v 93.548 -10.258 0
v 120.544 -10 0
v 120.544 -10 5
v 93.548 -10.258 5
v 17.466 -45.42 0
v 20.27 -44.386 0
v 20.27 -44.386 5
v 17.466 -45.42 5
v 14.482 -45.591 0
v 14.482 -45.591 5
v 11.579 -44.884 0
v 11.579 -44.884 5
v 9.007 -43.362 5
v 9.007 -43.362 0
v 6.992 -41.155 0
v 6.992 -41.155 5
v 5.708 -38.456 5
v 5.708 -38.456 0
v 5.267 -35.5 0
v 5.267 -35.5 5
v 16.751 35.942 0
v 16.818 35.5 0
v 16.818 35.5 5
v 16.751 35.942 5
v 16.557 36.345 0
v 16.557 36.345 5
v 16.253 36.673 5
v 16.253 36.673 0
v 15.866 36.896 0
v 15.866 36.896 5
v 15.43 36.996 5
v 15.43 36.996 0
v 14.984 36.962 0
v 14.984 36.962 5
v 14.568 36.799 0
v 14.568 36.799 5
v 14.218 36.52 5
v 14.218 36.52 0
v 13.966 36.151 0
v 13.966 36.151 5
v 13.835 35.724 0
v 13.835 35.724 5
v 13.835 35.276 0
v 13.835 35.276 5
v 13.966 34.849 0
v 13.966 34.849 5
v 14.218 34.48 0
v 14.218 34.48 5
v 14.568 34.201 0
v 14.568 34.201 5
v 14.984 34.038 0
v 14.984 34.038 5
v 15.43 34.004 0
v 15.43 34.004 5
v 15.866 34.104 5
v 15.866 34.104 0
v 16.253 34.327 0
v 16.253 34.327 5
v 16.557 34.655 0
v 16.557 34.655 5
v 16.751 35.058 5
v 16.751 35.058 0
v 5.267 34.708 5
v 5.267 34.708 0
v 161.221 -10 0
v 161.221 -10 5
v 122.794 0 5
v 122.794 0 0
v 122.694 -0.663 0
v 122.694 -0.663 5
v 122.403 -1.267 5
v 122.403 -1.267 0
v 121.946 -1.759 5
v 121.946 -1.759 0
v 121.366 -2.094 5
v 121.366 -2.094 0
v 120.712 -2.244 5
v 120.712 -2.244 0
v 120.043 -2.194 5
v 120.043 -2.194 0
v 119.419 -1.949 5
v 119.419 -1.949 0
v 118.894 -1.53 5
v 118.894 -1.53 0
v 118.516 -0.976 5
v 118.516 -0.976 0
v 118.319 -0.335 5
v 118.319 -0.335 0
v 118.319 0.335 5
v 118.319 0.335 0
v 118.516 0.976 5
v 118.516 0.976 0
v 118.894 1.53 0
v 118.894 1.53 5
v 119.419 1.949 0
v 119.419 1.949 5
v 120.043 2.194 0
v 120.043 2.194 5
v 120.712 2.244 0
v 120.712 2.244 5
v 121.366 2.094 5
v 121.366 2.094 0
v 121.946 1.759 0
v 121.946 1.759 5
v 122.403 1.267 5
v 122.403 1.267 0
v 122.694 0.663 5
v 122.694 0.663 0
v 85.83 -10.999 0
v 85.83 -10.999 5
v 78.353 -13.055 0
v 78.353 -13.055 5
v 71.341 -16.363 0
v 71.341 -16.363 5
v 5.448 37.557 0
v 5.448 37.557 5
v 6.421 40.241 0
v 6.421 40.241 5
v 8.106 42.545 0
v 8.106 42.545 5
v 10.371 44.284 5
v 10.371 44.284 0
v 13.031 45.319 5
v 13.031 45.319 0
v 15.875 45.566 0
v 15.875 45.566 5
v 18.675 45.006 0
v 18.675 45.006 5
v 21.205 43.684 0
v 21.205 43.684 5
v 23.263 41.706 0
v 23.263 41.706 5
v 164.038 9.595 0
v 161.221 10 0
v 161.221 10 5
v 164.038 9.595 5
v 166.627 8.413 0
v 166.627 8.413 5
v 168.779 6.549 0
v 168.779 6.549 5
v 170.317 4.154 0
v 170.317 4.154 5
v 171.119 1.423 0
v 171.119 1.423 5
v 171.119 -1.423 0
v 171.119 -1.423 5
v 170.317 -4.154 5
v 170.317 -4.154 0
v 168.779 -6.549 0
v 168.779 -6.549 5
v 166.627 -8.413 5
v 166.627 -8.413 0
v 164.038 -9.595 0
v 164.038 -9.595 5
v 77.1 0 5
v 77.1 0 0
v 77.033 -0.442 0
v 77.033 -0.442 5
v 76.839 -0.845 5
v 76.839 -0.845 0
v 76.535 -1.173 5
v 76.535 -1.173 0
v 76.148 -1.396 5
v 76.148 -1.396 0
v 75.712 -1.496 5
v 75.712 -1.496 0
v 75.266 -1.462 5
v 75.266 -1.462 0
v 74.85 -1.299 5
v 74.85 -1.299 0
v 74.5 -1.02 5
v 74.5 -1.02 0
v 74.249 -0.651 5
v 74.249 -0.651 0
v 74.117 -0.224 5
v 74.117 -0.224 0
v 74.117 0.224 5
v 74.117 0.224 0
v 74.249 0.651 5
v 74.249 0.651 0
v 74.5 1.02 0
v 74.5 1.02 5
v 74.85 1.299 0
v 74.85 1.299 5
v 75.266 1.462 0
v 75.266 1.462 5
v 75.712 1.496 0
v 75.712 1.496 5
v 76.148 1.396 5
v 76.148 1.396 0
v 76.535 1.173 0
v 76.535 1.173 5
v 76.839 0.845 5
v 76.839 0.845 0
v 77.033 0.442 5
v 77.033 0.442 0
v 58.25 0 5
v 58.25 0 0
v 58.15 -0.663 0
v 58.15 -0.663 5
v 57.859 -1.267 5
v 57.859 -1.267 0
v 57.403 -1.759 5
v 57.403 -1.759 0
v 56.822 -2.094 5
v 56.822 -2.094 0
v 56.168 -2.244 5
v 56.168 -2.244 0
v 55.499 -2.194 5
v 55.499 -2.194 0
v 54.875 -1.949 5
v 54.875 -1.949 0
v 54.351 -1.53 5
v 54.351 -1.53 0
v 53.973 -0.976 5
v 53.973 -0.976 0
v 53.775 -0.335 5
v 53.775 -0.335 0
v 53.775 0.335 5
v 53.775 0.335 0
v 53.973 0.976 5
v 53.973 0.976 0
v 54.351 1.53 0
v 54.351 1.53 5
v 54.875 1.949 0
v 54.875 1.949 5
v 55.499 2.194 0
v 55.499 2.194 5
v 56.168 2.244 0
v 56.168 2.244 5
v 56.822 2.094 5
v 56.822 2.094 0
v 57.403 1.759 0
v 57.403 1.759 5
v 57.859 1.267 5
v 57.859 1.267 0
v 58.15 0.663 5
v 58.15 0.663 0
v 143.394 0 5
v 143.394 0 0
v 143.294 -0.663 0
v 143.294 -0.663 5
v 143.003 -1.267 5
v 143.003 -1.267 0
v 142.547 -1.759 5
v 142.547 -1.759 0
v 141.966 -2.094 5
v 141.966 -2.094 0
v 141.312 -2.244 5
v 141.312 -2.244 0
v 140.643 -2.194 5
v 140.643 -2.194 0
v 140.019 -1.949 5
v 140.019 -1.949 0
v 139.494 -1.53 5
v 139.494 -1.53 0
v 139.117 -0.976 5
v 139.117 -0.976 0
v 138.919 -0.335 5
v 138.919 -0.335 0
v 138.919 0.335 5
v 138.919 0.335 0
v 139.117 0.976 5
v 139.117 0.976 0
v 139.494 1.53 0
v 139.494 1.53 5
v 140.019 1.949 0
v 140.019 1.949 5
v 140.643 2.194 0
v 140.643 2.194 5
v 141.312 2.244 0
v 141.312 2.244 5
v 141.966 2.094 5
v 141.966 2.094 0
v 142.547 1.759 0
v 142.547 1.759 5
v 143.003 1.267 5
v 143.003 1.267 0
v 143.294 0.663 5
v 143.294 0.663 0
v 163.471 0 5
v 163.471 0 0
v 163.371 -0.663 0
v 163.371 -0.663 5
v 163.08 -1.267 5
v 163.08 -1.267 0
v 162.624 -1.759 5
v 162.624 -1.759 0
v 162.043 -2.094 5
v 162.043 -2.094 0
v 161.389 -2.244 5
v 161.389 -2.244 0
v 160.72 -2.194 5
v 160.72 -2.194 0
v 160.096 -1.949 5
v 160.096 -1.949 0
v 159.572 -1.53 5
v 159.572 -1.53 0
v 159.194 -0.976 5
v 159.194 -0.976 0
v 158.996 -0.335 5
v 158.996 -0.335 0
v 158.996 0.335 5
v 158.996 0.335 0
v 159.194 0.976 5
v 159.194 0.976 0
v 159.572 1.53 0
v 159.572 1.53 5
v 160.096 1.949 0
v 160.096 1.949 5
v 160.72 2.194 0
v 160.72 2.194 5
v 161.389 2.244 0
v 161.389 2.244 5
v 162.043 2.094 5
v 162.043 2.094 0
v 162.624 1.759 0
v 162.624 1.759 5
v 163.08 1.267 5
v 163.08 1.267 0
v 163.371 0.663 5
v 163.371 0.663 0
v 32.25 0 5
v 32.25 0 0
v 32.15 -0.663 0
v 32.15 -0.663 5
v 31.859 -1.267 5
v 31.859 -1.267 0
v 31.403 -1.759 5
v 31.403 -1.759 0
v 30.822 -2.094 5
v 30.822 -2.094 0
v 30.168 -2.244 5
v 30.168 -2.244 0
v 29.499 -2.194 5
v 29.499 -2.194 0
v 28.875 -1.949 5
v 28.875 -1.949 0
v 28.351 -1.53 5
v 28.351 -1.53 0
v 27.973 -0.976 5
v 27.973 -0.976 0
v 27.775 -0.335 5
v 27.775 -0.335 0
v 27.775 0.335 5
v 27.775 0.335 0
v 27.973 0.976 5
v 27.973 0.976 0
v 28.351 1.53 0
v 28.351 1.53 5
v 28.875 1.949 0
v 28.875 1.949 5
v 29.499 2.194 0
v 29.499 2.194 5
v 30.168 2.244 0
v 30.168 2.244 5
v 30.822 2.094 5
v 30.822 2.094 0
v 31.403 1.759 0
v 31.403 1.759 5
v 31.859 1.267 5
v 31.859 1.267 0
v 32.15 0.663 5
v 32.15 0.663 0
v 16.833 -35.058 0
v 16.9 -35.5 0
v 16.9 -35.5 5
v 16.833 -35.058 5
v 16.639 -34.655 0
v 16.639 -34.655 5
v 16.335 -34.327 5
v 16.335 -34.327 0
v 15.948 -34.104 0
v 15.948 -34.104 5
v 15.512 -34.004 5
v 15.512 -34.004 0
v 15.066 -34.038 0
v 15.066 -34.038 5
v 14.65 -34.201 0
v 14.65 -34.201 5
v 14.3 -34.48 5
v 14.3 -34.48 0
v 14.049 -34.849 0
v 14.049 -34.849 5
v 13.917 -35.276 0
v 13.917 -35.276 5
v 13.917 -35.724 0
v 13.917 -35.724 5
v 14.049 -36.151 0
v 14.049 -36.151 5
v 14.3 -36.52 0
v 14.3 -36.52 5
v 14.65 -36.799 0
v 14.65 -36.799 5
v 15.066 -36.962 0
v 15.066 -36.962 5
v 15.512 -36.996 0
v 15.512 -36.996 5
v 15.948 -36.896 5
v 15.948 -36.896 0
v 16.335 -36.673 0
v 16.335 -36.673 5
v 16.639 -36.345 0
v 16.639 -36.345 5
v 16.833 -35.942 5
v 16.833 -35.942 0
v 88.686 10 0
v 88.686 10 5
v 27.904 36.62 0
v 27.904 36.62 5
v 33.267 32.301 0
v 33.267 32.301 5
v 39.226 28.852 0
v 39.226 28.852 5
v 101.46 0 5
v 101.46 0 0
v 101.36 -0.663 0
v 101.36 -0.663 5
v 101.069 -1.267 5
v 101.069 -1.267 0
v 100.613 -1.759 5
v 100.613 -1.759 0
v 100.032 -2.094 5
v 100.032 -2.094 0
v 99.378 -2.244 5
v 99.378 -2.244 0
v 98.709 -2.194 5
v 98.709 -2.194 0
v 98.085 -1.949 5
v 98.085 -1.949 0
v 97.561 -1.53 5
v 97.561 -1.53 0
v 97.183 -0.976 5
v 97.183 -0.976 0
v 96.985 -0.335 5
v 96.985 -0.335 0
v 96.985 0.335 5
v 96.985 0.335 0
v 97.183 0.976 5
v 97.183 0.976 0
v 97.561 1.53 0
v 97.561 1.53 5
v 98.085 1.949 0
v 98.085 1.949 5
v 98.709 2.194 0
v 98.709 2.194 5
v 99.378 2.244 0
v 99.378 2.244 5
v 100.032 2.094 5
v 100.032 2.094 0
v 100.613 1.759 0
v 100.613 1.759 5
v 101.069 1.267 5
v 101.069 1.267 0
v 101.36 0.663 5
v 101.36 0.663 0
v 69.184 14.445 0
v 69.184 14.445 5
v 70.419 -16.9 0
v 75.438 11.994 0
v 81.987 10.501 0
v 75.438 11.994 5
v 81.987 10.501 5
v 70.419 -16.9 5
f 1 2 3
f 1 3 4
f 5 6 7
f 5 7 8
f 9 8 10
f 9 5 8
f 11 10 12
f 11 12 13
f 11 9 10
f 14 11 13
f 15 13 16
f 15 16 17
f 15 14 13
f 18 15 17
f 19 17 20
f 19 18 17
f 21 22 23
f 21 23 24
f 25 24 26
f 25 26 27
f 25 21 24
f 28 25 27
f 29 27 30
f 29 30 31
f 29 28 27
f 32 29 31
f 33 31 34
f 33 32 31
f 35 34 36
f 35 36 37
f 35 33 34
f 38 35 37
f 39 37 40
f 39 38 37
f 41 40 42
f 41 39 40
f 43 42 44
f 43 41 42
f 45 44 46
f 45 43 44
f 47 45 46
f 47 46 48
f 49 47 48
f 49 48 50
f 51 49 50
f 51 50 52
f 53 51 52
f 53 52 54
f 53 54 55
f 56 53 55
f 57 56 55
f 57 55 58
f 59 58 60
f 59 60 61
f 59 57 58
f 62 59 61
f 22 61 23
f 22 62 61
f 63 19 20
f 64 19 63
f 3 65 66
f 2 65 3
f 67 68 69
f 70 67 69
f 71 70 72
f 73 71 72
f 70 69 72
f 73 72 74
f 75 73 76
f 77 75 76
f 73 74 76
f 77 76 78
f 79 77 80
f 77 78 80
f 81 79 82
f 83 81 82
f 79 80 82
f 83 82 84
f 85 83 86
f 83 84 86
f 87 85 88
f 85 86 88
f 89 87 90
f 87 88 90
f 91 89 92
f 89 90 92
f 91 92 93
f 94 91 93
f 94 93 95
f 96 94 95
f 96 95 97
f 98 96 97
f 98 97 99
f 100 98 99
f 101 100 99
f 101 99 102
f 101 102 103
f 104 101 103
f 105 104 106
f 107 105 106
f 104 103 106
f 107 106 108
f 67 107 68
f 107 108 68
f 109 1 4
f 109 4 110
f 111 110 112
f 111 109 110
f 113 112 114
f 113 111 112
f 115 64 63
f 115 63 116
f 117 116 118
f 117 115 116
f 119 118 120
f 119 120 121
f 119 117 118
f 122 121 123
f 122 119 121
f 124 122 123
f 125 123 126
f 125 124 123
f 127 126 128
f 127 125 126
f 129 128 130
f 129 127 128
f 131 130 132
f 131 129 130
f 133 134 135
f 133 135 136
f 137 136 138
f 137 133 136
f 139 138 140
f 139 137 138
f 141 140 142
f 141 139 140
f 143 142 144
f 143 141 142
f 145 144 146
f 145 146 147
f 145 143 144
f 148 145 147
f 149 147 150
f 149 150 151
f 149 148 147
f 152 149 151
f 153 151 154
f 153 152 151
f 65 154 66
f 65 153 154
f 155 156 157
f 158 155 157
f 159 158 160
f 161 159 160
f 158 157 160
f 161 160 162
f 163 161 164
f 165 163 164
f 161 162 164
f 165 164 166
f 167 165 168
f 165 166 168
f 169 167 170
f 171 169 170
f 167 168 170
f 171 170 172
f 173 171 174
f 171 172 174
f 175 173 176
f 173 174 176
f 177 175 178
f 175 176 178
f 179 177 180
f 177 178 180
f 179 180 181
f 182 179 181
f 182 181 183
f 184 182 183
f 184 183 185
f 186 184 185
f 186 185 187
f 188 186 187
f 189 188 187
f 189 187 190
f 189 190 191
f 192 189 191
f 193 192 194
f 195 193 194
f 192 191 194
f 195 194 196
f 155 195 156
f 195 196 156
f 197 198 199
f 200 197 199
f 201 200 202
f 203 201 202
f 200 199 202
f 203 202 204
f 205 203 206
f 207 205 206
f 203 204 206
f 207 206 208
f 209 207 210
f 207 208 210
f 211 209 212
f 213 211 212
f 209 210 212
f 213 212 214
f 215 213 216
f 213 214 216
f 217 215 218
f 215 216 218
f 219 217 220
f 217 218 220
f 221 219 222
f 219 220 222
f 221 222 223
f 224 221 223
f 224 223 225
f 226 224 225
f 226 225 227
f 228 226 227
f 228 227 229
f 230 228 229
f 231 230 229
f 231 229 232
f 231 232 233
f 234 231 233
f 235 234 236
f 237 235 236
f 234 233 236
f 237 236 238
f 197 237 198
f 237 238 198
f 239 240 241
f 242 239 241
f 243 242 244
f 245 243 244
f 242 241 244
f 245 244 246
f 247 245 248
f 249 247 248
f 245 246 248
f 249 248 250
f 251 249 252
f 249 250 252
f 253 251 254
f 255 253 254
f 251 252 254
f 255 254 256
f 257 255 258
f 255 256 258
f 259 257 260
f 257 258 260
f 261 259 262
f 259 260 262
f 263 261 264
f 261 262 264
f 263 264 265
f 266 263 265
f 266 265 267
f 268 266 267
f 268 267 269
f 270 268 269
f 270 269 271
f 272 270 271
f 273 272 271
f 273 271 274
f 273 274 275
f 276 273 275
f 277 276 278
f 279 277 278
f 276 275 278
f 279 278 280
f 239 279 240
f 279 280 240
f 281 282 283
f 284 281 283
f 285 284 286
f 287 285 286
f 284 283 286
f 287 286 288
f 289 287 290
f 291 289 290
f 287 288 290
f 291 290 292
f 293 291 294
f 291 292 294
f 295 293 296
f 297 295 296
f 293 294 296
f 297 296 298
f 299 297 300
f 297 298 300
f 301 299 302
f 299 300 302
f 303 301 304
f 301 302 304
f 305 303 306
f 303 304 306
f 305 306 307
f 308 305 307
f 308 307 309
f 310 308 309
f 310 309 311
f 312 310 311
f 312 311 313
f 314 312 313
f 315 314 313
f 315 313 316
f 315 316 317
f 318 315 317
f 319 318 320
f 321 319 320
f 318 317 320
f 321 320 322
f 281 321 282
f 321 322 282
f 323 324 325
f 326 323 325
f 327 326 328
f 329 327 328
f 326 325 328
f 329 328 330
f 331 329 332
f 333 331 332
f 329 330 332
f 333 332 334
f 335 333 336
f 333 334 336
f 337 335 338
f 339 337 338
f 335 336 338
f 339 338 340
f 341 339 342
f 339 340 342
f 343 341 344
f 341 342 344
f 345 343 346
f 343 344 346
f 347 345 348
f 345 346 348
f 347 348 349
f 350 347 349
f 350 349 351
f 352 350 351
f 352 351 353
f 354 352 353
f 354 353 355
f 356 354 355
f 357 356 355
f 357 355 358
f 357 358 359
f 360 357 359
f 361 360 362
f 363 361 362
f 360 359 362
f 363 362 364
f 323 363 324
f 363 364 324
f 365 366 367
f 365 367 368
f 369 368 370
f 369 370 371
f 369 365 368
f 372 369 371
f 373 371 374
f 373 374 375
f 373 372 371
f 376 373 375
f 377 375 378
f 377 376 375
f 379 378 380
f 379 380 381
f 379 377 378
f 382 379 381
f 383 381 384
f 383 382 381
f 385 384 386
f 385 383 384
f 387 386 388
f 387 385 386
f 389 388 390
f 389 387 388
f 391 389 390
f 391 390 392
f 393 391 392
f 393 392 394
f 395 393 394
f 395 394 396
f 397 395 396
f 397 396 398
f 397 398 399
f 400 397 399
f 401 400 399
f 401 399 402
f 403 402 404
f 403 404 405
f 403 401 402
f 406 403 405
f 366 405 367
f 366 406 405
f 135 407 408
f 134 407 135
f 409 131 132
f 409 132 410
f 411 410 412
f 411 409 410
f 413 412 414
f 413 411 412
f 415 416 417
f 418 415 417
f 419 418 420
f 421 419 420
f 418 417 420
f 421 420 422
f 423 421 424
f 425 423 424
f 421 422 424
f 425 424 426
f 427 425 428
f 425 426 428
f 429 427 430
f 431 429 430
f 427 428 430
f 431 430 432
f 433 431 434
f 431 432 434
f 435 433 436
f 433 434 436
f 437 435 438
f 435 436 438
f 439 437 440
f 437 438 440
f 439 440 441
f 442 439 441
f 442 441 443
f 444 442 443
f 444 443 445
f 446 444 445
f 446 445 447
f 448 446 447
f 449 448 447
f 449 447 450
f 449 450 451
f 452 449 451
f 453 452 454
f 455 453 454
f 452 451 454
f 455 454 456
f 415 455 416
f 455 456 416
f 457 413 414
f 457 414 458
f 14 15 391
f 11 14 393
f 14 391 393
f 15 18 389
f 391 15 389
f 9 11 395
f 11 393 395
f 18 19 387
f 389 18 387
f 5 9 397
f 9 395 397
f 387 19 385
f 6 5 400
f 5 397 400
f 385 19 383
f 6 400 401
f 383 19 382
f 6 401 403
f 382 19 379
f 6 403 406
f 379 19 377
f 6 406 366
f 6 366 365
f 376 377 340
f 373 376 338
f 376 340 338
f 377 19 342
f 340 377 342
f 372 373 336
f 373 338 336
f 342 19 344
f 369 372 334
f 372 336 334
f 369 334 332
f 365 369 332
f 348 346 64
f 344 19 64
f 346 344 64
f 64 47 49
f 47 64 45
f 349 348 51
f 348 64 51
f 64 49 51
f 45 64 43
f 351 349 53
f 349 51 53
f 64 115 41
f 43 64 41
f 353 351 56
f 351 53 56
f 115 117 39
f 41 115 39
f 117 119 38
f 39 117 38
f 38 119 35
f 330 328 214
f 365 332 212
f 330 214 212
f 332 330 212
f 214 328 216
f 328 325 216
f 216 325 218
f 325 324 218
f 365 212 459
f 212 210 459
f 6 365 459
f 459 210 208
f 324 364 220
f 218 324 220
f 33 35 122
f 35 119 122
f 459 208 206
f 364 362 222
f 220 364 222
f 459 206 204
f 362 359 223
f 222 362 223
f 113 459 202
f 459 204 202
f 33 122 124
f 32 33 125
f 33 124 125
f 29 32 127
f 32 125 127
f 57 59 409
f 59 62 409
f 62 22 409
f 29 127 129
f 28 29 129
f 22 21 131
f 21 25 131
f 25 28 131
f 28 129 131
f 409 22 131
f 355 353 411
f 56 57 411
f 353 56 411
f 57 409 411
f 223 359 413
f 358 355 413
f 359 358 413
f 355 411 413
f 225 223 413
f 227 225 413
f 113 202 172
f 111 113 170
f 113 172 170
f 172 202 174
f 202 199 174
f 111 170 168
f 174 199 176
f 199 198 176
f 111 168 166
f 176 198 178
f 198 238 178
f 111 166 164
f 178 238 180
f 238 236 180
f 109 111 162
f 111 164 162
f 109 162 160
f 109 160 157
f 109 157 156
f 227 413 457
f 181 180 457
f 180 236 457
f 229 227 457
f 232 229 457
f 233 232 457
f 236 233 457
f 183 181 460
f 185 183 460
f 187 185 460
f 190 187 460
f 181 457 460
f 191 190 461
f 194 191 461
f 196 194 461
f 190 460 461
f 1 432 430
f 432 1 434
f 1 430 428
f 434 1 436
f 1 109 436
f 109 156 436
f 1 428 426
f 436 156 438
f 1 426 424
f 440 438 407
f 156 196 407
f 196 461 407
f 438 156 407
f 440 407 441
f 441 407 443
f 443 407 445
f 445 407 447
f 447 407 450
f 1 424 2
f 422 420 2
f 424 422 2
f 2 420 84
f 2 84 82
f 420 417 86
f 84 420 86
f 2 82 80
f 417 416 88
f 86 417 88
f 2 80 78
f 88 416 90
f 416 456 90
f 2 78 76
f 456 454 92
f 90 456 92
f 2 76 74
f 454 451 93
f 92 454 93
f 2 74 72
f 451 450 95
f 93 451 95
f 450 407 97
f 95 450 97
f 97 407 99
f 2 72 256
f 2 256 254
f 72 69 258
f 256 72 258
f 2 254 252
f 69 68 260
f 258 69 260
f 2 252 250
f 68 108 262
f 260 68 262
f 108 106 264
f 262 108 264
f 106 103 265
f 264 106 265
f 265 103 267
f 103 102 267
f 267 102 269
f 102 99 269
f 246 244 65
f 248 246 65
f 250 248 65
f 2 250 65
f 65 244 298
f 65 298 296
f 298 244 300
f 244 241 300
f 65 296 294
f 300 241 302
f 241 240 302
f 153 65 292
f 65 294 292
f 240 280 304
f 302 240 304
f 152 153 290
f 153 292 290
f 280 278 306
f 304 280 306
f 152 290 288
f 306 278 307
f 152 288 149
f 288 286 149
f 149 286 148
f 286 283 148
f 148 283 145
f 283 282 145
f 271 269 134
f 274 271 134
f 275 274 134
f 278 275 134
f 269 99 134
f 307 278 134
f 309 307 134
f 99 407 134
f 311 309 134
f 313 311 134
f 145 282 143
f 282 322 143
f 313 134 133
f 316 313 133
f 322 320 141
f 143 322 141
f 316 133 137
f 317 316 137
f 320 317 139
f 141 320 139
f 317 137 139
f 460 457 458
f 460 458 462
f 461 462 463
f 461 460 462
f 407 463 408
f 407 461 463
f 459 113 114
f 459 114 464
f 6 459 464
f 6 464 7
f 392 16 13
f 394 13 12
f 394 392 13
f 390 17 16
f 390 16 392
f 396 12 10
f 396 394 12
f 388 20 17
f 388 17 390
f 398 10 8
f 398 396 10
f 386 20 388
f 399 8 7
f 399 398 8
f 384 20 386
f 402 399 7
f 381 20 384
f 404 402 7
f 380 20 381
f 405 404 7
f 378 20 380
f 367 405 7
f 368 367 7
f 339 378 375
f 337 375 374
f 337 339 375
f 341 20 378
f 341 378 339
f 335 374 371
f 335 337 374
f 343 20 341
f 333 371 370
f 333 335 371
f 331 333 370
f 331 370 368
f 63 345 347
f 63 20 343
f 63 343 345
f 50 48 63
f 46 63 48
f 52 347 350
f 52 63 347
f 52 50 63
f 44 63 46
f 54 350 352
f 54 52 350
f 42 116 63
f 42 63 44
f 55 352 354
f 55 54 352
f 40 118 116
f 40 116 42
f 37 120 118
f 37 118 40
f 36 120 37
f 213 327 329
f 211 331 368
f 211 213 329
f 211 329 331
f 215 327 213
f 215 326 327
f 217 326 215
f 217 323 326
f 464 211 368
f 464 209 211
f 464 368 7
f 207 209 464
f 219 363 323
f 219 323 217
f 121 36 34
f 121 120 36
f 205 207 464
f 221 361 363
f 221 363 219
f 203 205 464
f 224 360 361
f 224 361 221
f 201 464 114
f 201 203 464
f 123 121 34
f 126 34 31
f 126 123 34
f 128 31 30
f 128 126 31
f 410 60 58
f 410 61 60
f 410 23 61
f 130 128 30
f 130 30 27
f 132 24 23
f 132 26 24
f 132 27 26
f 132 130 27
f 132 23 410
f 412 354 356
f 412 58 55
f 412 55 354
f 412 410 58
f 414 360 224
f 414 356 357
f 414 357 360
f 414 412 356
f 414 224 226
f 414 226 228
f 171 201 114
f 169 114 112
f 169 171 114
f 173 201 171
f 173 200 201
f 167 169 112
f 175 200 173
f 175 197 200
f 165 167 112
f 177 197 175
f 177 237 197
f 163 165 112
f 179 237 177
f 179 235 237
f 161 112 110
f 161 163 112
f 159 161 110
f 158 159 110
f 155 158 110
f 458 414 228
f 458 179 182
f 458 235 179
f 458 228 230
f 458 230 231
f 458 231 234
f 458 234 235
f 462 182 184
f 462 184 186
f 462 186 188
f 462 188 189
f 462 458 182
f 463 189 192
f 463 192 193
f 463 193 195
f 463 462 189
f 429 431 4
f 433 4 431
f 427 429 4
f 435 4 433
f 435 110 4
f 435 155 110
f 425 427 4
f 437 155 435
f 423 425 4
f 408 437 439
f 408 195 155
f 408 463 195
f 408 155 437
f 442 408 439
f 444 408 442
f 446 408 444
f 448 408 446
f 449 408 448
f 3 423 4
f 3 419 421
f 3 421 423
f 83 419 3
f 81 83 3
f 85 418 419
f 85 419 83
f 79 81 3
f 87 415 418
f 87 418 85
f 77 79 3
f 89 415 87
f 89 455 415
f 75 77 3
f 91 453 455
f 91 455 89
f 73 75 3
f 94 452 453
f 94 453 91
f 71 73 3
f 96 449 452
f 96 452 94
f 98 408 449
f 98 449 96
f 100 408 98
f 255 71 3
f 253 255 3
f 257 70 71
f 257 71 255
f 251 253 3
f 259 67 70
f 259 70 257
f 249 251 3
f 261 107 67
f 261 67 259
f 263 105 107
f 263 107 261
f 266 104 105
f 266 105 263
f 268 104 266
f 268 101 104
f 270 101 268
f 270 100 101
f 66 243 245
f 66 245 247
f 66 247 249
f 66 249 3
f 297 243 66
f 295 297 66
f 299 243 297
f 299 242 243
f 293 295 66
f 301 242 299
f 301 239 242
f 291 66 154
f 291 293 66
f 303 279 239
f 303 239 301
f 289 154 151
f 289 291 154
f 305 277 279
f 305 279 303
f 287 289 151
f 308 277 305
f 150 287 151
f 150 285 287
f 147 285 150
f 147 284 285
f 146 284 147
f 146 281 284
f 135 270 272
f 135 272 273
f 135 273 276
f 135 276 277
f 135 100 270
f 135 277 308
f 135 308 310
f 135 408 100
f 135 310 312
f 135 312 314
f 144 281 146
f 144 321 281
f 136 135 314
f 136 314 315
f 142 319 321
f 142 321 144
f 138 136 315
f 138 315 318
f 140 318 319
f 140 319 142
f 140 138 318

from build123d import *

# Parameters (mm, degrees)
CROQUIS1_R              = 2.25
CROQUIS1_R_2            = 2.55
CROQUIS1_R_3            = 1.5
SALIENTE_EXTRUIR1_DEPTH = 5
SALIENTE_EXTRUIR2_START = -5
CROQUIS2_R              = 2.55
CROQUIS2_R_2            = 1.5
SALIENTE_EXTRUIR2_DEPTH = 5


with BuildPart() as part:
    # Croquis1 → Saliente-Extruir1 (new body)
    with BuildSketch(Plane(origin=(0, 0, 0), x_dir=(-1, 0, 0), z_dir=(0, 0, -1))):
        with BuildLine():
            Line((-71.341040378, -16.363356968), (-70.419428585, -16.899757727))
            Line((-70.419428585, -16.899757727), (-20.270039886, -44.385636378))
            ThreePointArc((-20.270039886, -44.385636378), (-10.236419944, -44.21832916), (-5.267289487, -35.5))
            Line((-5.267289487, -35.5), (-5.267289487, 34.708239567))
            ThreePointArc((-5.267289487, 34.708239567), (-11.664110706, 44.896341112), (-23.263165727, 41.705940291))
            ThreePointArc((-23.263165727, 41.705940291), (-30.502802881, 34.357904526), (-39.225518904, 28.851526324))
            Line((-39.225518904, 28.851526324), (-69.184263586, 14.445246544))
            ThreePointArc((-69.184263586, 14.445246544), (-78.684950229, 11.125383731), (-88.685852551, 10))
            Line((-88.685852551, 10), (-120.543509993, 10))
            Line((-120.543509993, 10), (-161.221070033, 10))
            ThreePointArc((-161.221070033, 10), (-171.221070033, 0), (-161.221070033, -10))
            Line((-161.221070033, -10), (-120.543509993, -10))
            Line((-120.543509993, -10), (-93.547882821, -10.2575901))
            ThreePointArc((-93.547882821, -10.2575901), (-82.047232991, -11.865742134), (-71.341040378, -16.363356968))
        make_face()
        with Locations(Location((-30, 0, 0), (0, 0, 180))):
            Circle(CROQUIS1_R, mode=Mode.SUBTRACT)
        with Locations(Location((-15.4, -35.5, 0), (0, 0, 180))):
            Circle(CROQUIS1_R_2, mode=Mode.SUBTRACT)
        with Locations(Location((-15.317880165, 35.5, 0), (0, 0, 180))):
            Circle(CROQUIS1_R_2, mode=Mode.SUBTRACT)
        with Locations(Location((-141.14380115, 0, 0), (0, 0, 180))):
            Circle(CROQUIS1_R, mode=Mode.SUBTRACT)
        with Locations(Location((-161.221070033, 0, 0), (0, 0, 180))):
            Circle(CROQUIS1_R, mode=Mode.SUBTRACT)
        with Locations(Location((-56, 0, 0), (0, 0, 180))):
            Circle(CROQUIS1_R, mode=Mode.SUBTRACT)
        with Locations(Location((-75.6, 0, 0), (0, 0, 180))):
            Circle(CROQUIS1_R_3, mode=Mode.SUBTRACT)
        with Locations(Location((-99.210066217, 0, 0), (0, 0, 180))):
            Circle(CROQUIS1_R, mode=Mode.SUBTRACT)
        with Locations(Location((-120.543509993, 0, 0), (0, 0, 180))):
            Circle(CROQUIS1_R, mode=Mode.SUBTRACT)
    extrude(amount=-SALIENTE_EXTRUIR1_DEPTH)

    # Croquis2 → Saliente-Extruir2 (add)
    # profile 1 of 2: a face of its own
    with BuildSketch(Plane.XY.offset(5).offset(SALIENTE_EXTRUIR2_START)):
        with Locations((15.4, -35.5)):
            Circle(CROQUIS2_R)
        with Locations((15.4, -35.5)):
            Circle(CROQUIS2_R_2, mode=Mode.SUBTRACT)
    # profile 2 of 2: a face of its own
    with BuildSketch(Plane.XY.offset(5).offset(SALIENTE_EXTRUIR2_START)):
        with Locations((15.317880165, 35.5)):
            Circle(CROQUIS2_R)
        with Locations((15.317880165, 35.5)):
            Circle(CROQUIS2_R_2, mode=Mode.SUBTRACT)
    extrude(amount=SALIENTE_EXTRUIR2_DEPTH)


solid = part.part
